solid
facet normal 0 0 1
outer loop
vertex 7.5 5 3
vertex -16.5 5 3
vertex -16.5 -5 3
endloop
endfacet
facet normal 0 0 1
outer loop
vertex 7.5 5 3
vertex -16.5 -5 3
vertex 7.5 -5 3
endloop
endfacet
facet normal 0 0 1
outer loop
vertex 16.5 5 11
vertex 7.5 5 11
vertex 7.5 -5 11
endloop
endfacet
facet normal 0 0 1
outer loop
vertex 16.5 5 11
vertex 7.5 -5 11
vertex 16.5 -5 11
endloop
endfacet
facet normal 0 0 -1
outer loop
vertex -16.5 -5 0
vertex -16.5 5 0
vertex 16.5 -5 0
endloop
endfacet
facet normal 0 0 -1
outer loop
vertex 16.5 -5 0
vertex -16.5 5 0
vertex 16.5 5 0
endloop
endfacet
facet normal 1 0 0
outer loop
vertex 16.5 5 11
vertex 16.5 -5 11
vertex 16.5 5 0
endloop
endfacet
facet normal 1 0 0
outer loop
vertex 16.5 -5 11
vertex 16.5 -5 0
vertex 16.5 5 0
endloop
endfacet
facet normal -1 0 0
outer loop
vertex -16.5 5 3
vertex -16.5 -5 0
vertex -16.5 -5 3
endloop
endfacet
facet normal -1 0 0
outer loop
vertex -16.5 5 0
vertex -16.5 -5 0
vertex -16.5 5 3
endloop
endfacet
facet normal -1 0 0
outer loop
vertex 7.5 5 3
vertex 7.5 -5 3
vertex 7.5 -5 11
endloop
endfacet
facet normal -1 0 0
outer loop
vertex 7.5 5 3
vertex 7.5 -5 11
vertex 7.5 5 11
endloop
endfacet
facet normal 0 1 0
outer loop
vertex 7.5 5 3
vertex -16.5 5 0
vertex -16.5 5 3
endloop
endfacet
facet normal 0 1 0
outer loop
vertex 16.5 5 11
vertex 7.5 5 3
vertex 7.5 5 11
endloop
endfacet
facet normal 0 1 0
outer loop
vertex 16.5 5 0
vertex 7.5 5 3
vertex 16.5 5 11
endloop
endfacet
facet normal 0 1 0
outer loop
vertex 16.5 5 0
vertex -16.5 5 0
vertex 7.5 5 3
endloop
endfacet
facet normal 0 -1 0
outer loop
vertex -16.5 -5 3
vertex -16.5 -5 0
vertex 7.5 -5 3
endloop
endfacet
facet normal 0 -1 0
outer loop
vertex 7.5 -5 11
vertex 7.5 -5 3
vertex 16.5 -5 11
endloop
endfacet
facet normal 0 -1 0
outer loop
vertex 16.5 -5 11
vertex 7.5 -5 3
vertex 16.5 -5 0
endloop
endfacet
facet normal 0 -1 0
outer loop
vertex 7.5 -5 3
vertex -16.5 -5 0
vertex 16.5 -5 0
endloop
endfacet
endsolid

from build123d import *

# Parameters (mm, degrees)
SKETCH_W     = 33
SKETCH_H     = 10
PAD_DEPTH    = 3
SKETCH001_W  = 9
SKETCH001_H  = 10
PAD001_DEPTH = 8


with BuildPart() as part:
    # Sketch → Pad (new body)
    with BuildSketch(Plane.XY):
        Rectangle(SKETCH_W, SKETCH_H)
    extrude(amount=PAD_DEPTH)

    # Sketch001 → Pad001 (join)
    with BuildSketch(Plane.XY.offset(3)):
        with Locations((12, 0)):
            Rectangle(SKETCH001_W, SKETCH001_H)
    extrude(amount=PAD001_DEPTH)


solid = part.part
